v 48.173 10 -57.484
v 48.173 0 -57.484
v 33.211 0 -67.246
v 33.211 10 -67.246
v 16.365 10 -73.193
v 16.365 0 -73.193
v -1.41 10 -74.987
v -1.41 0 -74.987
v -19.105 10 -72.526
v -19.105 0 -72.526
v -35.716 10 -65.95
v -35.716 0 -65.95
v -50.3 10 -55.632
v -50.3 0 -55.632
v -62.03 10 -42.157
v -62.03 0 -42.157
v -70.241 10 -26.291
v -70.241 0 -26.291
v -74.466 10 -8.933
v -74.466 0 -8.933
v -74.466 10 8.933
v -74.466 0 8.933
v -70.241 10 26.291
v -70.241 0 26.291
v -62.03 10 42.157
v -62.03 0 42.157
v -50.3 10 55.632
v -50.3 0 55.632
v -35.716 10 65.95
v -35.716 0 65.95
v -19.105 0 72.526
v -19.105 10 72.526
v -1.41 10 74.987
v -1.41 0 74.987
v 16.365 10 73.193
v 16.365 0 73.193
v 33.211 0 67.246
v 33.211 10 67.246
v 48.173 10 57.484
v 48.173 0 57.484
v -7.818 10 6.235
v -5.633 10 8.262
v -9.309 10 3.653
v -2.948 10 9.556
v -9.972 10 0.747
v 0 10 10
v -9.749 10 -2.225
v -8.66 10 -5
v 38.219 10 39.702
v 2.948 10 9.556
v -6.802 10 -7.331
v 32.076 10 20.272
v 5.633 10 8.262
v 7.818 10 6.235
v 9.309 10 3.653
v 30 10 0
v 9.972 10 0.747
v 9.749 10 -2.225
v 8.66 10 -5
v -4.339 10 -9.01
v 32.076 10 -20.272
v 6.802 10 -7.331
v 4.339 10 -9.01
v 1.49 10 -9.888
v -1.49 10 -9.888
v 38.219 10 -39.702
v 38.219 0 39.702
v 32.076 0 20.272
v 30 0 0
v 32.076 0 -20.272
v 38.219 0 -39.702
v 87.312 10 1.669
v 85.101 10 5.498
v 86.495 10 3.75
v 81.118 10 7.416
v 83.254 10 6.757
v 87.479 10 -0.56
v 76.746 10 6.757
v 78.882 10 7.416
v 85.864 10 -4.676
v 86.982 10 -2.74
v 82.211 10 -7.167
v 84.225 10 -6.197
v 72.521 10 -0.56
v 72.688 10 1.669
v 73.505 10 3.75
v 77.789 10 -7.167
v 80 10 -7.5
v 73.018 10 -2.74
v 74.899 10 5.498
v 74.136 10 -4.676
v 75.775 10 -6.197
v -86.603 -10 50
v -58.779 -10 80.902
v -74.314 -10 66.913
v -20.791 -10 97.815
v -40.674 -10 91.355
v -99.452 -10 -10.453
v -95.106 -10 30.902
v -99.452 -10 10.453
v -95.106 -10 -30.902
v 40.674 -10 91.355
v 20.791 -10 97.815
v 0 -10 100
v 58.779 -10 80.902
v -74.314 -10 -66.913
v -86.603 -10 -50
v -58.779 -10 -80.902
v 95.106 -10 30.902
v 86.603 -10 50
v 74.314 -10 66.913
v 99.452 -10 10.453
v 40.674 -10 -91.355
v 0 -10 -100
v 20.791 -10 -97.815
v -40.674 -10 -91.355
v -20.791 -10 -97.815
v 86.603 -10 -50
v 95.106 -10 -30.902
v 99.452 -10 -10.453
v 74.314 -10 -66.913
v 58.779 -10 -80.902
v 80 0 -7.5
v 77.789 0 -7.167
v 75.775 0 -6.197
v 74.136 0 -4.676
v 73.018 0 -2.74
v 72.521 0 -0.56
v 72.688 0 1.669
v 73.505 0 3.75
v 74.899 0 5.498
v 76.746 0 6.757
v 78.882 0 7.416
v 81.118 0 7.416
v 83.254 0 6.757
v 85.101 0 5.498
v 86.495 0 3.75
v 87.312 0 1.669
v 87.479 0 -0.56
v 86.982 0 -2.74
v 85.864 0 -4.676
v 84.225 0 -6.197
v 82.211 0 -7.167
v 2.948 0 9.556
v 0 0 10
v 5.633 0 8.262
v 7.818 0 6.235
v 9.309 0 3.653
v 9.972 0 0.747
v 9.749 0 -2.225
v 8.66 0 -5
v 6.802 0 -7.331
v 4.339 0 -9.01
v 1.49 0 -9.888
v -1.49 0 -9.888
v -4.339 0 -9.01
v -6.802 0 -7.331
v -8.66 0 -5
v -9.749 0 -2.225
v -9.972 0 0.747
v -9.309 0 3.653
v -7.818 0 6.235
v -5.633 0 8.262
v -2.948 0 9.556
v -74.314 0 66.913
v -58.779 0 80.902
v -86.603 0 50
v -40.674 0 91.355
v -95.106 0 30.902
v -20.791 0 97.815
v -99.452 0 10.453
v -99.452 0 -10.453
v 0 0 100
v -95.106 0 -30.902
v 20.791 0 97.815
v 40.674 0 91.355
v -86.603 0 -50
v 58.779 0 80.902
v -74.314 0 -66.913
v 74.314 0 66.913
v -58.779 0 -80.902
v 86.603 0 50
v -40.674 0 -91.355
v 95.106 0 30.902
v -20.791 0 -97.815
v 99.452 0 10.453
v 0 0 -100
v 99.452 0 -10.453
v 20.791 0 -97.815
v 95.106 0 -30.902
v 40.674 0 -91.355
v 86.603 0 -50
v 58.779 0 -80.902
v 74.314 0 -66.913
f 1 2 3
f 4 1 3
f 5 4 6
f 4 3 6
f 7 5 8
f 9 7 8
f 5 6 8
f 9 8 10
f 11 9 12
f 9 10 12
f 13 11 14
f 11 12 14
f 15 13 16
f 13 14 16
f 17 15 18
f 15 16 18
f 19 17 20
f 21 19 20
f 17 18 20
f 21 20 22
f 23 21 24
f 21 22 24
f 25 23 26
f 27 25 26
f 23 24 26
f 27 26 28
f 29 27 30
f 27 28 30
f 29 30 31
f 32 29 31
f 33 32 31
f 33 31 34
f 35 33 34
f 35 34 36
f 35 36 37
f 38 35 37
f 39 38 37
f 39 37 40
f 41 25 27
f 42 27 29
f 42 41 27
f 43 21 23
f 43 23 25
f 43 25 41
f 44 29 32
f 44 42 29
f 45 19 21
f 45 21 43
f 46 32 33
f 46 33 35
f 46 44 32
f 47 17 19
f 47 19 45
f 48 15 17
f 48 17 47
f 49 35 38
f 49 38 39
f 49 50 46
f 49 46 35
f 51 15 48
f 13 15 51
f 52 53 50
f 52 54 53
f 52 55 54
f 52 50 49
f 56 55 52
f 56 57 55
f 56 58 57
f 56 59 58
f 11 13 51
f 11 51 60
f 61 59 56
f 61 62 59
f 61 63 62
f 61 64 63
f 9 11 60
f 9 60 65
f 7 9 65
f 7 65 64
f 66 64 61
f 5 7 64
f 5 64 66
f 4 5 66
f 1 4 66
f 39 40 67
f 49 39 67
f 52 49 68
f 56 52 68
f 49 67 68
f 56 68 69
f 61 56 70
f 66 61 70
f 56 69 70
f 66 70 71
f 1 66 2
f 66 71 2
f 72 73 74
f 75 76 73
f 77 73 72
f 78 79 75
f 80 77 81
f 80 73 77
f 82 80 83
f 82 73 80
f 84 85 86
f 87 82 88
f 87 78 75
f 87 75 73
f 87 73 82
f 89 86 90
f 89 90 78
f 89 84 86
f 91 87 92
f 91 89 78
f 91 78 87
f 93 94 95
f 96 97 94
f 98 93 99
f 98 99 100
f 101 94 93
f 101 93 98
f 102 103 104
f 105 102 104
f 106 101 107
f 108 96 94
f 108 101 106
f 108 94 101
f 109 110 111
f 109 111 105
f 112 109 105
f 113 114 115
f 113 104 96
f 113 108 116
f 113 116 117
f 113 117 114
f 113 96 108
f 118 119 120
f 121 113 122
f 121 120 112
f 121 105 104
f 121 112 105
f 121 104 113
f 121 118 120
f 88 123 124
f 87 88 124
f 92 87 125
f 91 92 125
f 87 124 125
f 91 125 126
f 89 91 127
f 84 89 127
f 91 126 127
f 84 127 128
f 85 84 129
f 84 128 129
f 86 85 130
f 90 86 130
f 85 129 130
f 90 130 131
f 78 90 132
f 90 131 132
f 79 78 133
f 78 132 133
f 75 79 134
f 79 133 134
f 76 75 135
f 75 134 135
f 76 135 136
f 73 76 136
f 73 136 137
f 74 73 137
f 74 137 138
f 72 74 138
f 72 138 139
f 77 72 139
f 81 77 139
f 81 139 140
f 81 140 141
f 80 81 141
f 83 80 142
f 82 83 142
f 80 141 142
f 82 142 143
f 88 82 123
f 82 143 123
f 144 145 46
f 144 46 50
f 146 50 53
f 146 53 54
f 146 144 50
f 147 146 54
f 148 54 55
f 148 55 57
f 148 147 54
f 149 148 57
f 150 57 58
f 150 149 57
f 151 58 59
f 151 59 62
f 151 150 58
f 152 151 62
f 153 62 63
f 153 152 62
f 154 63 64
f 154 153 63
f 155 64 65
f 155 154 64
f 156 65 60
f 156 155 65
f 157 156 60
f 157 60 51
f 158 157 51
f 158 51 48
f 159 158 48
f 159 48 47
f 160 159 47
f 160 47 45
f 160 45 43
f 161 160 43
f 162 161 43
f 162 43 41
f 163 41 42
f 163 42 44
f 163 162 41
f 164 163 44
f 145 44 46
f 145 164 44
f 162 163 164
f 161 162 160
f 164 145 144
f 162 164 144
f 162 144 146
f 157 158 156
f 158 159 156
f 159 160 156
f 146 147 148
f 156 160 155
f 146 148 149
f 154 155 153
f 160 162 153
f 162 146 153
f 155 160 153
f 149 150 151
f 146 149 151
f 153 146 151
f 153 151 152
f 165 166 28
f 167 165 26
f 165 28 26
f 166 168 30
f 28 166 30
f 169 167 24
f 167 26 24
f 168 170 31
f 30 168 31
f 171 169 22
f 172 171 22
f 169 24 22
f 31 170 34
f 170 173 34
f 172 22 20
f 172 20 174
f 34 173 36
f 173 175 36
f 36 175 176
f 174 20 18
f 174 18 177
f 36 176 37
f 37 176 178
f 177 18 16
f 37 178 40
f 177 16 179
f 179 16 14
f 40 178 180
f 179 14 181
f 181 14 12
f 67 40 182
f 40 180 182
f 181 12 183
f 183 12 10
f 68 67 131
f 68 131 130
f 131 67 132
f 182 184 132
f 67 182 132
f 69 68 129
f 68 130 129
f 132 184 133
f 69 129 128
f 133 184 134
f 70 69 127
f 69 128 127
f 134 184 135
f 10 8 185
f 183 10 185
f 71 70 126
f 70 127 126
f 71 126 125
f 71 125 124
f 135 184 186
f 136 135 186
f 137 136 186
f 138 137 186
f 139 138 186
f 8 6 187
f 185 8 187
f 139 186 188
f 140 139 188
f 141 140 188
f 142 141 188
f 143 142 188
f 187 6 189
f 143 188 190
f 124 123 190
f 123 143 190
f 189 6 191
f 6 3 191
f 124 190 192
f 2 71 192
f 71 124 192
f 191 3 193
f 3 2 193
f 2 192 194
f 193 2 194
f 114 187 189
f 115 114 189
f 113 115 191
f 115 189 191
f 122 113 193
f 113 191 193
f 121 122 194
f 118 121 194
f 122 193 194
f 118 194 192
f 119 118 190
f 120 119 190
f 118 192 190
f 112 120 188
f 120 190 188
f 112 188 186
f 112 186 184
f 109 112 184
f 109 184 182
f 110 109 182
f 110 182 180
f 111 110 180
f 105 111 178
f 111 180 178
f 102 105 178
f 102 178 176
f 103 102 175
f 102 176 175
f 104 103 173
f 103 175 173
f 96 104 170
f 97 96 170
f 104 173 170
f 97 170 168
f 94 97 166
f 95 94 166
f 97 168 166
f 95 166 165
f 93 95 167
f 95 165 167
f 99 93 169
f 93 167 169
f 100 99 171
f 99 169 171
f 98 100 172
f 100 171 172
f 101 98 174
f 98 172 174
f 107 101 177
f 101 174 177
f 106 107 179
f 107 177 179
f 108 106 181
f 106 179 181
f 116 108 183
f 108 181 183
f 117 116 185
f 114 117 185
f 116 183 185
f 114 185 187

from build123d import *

# Parameters (mm, degrees)
SKETCH1_R           = 10
BOSS_EXTRUDE1_DEPTH = 10
SKETCH2_R           = 100
BOSS_EXTRUDE2_DEPTH = 10
SKETCH3_R           = 7.5
BOSS_EXTRUDE3_DEPTH = 10


with BuildPart() as part:
    # Sketch1 → Boss-Extrude1 (new body)
    with BuildSketch(Plane(origin=(0, 0, 0), x_dir=(1, 0, 0), z_dir=(0, 1, 0))):
        with BuildLine():
            ThreePointArc((48.173076923, 57.483516418), (-75, 0), (48.173076923, -57.483516418))
            ThreePointArc((48.173076923, -57.483516418), (30, 0), (48.173076923, 57.483516418))
        make_face()
        with Locations(Location((0, 0, 0), (0, 0, 270))):
            Circle(SKETCH1_R, mode=Mode.SUBTRACT)
    extrude(amount=BOSS_EXTRUDE1_DEPTH)

    # Sketch2 → Boss-Extrude2 (add)
    with BuildSketch(Plane.XZ):
        with Locations(Location((0, 0, 0), (0, 0, 270))):
            Circle(SKETCH2_R)
    extrude(amount=BOSS_EXTRUDE2_DEPTH)

    # Sketch3 → Boss-Extrude3 (add)
    with BuildSketch(Plane(origin=(0, 0, 0), x_dir=(1, 0, 0), z_dir=(0, 1, 0))):
        with Locations(Location((80, 0, 0), (0, 0, 90))):
            Circle(SKETCH3_R)
    extrude(amount=BOSS_EXTRUDE3_DEPTH)


solid = part.part
